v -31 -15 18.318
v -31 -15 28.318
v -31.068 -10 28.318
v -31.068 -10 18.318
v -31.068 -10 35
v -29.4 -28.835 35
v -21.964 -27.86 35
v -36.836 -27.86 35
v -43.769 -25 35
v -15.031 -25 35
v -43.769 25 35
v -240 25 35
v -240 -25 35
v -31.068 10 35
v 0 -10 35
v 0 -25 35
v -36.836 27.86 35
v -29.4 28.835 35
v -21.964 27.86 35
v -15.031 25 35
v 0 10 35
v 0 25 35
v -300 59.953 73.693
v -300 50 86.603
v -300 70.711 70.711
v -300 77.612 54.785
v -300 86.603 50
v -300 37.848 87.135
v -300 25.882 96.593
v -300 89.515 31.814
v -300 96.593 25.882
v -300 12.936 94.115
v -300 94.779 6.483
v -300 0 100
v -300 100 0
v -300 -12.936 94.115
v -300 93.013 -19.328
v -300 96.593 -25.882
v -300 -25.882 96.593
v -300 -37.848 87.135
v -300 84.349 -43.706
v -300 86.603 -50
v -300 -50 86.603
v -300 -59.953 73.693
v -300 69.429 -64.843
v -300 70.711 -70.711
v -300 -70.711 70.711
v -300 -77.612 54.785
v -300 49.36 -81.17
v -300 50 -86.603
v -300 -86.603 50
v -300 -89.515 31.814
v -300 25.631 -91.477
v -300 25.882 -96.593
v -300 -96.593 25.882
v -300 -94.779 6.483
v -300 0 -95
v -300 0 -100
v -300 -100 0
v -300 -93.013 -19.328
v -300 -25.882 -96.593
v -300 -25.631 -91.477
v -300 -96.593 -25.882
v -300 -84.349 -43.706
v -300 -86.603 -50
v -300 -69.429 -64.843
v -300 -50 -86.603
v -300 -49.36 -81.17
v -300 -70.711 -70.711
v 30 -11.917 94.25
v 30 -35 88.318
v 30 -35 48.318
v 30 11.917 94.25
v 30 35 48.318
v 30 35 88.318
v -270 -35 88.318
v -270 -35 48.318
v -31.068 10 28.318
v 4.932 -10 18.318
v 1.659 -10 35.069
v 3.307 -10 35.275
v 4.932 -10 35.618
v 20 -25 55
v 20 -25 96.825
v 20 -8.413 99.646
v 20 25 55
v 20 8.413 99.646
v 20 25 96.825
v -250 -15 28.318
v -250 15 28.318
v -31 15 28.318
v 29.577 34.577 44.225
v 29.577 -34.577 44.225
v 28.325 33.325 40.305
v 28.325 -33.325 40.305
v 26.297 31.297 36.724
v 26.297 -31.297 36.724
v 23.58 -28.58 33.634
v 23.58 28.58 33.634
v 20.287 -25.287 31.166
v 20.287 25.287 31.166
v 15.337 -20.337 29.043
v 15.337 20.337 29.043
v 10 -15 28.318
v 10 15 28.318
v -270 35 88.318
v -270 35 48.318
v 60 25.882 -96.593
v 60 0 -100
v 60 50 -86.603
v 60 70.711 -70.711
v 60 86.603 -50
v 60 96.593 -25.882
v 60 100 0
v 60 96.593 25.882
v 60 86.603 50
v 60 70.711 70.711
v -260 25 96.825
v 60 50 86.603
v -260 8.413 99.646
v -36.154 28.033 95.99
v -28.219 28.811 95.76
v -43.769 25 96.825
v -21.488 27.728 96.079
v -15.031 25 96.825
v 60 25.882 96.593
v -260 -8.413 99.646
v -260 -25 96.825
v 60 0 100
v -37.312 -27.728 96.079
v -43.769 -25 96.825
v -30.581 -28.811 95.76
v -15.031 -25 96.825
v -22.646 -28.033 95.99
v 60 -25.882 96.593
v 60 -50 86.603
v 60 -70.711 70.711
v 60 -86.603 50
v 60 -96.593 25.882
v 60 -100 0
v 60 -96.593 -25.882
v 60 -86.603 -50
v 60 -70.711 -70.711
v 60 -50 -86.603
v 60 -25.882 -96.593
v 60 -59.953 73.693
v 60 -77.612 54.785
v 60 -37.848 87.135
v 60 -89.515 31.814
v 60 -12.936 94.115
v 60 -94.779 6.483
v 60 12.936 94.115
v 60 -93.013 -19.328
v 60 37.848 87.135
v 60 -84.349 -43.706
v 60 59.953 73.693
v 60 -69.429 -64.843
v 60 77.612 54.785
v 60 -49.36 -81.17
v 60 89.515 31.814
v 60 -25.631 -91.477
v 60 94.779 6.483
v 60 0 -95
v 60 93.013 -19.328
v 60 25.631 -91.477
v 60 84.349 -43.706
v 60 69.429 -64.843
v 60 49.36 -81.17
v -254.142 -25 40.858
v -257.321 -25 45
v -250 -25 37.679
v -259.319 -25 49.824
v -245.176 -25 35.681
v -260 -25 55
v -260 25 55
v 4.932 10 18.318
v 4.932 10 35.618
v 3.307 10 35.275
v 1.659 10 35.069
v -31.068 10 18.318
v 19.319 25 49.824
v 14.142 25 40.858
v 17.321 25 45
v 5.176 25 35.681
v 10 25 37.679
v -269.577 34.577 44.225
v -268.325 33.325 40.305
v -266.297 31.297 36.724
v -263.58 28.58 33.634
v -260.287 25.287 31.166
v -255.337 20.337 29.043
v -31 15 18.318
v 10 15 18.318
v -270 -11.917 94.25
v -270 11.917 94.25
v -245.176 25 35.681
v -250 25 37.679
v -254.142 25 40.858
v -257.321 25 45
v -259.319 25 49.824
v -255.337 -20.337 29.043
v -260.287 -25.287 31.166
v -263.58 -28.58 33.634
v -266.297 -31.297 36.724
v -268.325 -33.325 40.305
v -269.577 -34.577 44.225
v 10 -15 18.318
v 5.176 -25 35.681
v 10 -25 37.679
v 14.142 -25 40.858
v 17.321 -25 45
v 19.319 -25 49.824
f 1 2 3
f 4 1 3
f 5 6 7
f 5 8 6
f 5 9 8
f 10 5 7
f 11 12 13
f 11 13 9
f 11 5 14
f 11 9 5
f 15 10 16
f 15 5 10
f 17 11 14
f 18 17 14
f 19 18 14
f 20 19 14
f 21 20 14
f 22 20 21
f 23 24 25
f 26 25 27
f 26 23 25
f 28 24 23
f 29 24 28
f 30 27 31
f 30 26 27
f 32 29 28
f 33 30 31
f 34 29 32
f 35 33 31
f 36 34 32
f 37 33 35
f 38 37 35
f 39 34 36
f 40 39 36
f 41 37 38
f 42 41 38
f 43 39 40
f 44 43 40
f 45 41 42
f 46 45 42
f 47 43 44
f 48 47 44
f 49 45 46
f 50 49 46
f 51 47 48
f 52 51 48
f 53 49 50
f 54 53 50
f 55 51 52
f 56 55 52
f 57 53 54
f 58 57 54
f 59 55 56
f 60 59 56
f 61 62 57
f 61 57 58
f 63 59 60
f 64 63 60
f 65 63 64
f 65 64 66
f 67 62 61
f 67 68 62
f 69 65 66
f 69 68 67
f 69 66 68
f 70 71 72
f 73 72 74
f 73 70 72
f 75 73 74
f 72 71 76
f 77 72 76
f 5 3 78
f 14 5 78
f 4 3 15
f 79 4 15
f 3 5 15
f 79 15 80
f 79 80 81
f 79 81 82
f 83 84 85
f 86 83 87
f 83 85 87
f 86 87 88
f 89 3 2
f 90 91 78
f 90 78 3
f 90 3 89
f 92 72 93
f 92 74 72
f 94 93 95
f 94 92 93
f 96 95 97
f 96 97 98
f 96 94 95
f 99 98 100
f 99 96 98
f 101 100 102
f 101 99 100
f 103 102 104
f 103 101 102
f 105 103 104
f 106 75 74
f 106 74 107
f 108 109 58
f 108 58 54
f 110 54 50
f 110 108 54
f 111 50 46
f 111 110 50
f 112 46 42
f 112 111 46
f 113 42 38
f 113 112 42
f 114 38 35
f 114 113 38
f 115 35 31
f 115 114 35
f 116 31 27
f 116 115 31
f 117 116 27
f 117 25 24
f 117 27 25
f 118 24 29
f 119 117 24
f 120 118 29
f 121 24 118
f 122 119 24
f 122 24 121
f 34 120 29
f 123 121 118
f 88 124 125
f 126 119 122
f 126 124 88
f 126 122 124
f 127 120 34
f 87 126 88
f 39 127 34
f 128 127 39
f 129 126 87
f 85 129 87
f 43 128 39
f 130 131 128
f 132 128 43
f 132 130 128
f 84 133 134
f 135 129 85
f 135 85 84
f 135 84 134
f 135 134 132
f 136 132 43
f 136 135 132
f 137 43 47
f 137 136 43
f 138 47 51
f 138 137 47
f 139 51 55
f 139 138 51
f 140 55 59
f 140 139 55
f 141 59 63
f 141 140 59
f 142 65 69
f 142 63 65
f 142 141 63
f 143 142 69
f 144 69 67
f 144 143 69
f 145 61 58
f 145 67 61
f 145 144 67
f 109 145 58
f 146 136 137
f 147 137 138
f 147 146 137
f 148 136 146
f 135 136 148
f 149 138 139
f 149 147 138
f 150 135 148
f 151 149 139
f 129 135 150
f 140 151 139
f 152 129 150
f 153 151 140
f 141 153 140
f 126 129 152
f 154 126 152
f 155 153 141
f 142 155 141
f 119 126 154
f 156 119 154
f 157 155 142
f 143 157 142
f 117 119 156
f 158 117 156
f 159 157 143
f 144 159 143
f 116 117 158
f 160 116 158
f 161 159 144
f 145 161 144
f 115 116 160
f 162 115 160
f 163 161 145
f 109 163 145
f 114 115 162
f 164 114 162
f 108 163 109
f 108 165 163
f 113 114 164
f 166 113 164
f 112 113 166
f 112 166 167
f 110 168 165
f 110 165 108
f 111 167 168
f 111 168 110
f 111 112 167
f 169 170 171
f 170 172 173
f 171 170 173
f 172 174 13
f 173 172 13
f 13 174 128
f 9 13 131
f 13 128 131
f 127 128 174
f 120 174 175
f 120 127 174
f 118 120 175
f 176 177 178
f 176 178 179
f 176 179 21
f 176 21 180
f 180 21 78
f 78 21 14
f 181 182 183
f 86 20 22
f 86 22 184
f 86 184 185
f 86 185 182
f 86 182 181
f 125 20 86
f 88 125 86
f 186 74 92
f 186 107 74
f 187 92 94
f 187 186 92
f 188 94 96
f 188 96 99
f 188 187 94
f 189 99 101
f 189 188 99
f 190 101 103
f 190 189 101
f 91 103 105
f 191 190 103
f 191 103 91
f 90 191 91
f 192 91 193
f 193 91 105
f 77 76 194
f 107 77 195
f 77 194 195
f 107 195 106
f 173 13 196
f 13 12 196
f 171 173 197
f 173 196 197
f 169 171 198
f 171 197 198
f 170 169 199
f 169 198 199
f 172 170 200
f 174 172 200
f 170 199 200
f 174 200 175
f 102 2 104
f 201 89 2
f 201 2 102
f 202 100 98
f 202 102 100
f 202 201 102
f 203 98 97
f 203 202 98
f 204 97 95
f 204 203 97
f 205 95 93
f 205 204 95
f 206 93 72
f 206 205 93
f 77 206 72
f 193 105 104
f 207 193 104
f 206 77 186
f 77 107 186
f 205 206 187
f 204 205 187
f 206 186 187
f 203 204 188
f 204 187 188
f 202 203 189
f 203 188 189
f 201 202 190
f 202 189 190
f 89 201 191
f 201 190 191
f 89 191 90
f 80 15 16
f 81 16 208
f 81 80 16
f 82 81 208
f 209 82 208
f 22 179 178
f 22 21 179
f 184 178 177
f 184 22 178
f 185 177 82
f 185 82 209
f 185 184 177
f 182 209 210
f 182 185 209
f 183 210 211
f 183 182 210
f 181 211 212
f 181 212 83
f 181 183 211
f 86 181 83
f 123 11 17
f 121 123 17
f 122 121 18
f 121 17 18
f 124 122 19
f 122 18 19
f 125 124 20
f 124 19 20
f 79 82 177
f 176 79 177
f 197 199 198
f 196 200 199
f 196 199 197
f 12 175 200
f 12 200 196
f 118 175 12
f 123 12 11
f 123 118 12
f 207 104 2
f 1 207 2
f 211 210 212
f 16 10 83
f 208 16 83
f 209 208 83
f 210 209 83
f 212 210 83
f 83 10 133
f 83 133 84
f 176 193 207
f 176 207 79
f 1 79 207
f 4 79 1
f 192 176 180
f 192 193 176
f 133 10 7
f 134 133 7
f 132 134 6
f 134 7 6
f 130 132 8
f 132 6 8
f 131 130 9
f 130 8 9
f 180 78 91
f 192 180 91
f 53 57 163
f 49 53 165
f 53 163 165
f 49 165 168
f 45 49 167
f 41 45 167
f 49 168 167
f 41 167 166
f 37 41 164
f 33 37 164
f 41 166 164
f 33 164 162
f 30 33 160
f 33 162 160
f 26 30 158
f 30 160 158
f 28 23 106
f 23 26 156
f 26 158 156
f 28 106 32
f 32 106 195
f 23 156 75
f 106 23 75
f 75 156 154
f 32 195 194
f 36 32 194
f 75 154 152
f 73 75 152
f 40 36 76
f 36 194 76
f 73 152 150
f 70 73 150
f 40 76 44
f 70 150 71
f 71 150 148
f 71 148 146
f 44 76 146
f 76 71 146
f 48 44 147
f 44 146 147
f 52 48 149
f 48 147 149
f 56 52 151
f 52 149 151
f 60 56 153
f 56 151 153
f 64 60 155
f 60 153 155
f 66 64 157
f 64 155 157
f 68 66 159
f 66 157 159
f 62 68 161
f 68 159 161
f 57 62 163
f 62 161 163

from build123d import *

# Parameters (mm, degrees)
SKETCH_1_W           = 300
SKETCH_1_H           = 100
SKETCH_2_R           = 95
CUT_EXTRUDE_1_DEPTH  = 332.662479036
EXTRUDE_START        = 60
SKETCH_5_R           = 100
SKETCH_5_R_2         = 95
EXTRUDE_1_DEPTH      = 60
SKETCH_6_W           = 280
SKETCH_6_H           = 50
CUT_EXTRUDE_2_DEPTH  = 10
EXTRUDE_3_DEPTH      = 290
EXTRUDE_3_DEPTH_BACK = 10
SKETCH_14_W          = 300
SKETCH_14_H          = 70
EXTRUDE_5_DEPTH      = 60
SKETCH_13_W          = 280
SKETCH_13_H          = 50
CUT_EXTRUDE_3_DEPTH  = 65
FILLET_1_R           = 20
EXTRUDE_6_DEPTH      = 10
SKETCH_16_W          = 36
SKETCH_16_H          = 20
CUT_EXTRUDE_4_DEPTH  = 10
SKETCH_17_R          = 28.835
CUT_EXTRUDE_5_DEPTH  = 344.838624939


with BuildPart() as part:
    # 草图1 → 旋转1 (revolve)
    with BuildSketch(Plane(origin=(0, 0, 0), x_dir=(1, 0, 0), z_dir=(0, 1, 0)), mode=Mode.PRIVATE) as revolve_1_sk:
        with Locations((-150, -50)):
            Rectangle(SKETCH_1_W, SKETCH_1_H)
    revolve(revolve_1_sk.sketch.rotate(Axis((0, 0, 0), (-1, 0, 0)), 180), axis=Axis((0, 0, 0), (-1, 0, 0)))

    # 草图2 → 切除-拉伸1 (cut, through all)
    with BuildSketch(Plane(origin=(0, 0, 0), x_dir=(0, 0, -1), z_dir=(1, 0, 0))):
        Circle(SKETCH_2_R)
    extrude(amount=-CUT_EXTRUDE_1_DEPTH, mode=Mode.SUBTRACT)

    # 草图5 → 凸台-拉伸1 (add)
    with BuildSketch(Plane(origin=(0, 0, 0), x_dir=(0, 0, -1), z_dir=(1, 0, 0)).offset(EXTRUDE_START)):
        Circle(SKETCH_5_R)
        Circle(SKETCH_5_R_2, mode=Mode.SUBTRACT)
    extrude(amount=-EXTRUDE_1_DEPTH)

    # 草图6 → 切除-拉伸2 (cut)
    with BuildSketch(Plane.XY.offset(100)):
        with Locations((-120, 0)):
            Rectangle(SKETCH_6_W, SKETCH_6_H)
    extrude(amount=-CUT_EXTRUDE_2_DEPTH, mode=Mode.SUBTRACT)

    # 草图9 → 凸台-拉伸3 (add, two sides: drawn at the far end of the back side and taken through both)
    with BuildSketch(Plane.ZY.offset(-20).offset(-EXTRUDE_3_DEPTH_BACK)):
        with BuildLine():
            Line((88.317608663, 35), (88.317608663, -35))
            ThreePointArc((88.317608663, -35), (95, 0), (88.317608663, 35))
        make_face()
    extrude(amount=EXTRUDE_3_DEPTH + EXTRUDE_3_DEPTH_BACK)

    # 草图14 → 凸台-拉伸5 (add)
    with BuildSketch(Plane(origin=(0, 0, 88.317608663), x_dir=(-1, 0, 0), z_dir=(0, 0, -1))):
        with Locations((120, 0)):
            Rectangle(SKETCH_14_W, SKETCH_14_H)
    extrude(amount=EXTRUDE_5_DEPTH)

    # 草图13 → 切除-拉伸3 (cut)
    with BuildSketch(Plane.XY.offset(100)):
        with Locations((-120, 0)):
            Rectangle(SKETCH_13_W, SKETCH_13_H)
    extrude(amount=-CUT_EXTRUDE_3_DEPTH, mode=Mode.SUBTRACT)

    # 圆角1
    fillet_1_edges = [part.edges().sort_by_distance(p)[0] for p in [
        (-270, 0, 28.317608663),
        (-120, 35, 28.317608663),
        (30, 0, 28.317608663),
        (-120, -35, 28.317608663),
        (-260, 0, 35),
        (20, 0, 35),
    ]]
    fillet(fillet_1_edges, radius=FILLET_1_R)

    # 草图15 → 凸台-拉伸6 (add)
    with BuildSketch(Plane(origin=(0, 0, 28.317608663), x_dir=(-1, 0, 0), z_dir=(0, 0, -1))):
        Polygon((-4.931797057, -10), (-4.931797057, 10), (31.068202943, 10), (31, 15), (-4.931797057, 15), (-10, 15), (-10, 10), (-10, -10), (-10, -15), (-4.931797057, -15), (31, -15), (31.068202943, -10), align=None)
    extrude(amount=EXTRUDE_6_DEPTH)

    # 草图16 → 切除-拉伸4 (cut)
    with BuildSketch(Plane(origin=(0, 0, 28.317608663), x_dir=(-1, 0, 0), z_dir=(0, 0, -1))):
        with Locations((13.068202943, 0)):
            Rectangle(SKETCH_16_W, SKETCH_16_H)
    extrude(amount=-CUT_EXTRUDE_4_DEPTH, mode=Mode.SUBTRACT)

    # 草图17 → 切除-拉伸5 (cut, through all)
    with BuildSketch(Plane(origin=(0, 0, 35), x_dir=(-1, 0, 0), z_dir=(0, 0, -1))):
        with Locations((29.4, 0)):
            Circle(SKETCH_17_R)
    extrude(amount=-CUT_EXTRUDE_5_DEPTH, mode=Mode.SUBTRACT)


solid = part.part
